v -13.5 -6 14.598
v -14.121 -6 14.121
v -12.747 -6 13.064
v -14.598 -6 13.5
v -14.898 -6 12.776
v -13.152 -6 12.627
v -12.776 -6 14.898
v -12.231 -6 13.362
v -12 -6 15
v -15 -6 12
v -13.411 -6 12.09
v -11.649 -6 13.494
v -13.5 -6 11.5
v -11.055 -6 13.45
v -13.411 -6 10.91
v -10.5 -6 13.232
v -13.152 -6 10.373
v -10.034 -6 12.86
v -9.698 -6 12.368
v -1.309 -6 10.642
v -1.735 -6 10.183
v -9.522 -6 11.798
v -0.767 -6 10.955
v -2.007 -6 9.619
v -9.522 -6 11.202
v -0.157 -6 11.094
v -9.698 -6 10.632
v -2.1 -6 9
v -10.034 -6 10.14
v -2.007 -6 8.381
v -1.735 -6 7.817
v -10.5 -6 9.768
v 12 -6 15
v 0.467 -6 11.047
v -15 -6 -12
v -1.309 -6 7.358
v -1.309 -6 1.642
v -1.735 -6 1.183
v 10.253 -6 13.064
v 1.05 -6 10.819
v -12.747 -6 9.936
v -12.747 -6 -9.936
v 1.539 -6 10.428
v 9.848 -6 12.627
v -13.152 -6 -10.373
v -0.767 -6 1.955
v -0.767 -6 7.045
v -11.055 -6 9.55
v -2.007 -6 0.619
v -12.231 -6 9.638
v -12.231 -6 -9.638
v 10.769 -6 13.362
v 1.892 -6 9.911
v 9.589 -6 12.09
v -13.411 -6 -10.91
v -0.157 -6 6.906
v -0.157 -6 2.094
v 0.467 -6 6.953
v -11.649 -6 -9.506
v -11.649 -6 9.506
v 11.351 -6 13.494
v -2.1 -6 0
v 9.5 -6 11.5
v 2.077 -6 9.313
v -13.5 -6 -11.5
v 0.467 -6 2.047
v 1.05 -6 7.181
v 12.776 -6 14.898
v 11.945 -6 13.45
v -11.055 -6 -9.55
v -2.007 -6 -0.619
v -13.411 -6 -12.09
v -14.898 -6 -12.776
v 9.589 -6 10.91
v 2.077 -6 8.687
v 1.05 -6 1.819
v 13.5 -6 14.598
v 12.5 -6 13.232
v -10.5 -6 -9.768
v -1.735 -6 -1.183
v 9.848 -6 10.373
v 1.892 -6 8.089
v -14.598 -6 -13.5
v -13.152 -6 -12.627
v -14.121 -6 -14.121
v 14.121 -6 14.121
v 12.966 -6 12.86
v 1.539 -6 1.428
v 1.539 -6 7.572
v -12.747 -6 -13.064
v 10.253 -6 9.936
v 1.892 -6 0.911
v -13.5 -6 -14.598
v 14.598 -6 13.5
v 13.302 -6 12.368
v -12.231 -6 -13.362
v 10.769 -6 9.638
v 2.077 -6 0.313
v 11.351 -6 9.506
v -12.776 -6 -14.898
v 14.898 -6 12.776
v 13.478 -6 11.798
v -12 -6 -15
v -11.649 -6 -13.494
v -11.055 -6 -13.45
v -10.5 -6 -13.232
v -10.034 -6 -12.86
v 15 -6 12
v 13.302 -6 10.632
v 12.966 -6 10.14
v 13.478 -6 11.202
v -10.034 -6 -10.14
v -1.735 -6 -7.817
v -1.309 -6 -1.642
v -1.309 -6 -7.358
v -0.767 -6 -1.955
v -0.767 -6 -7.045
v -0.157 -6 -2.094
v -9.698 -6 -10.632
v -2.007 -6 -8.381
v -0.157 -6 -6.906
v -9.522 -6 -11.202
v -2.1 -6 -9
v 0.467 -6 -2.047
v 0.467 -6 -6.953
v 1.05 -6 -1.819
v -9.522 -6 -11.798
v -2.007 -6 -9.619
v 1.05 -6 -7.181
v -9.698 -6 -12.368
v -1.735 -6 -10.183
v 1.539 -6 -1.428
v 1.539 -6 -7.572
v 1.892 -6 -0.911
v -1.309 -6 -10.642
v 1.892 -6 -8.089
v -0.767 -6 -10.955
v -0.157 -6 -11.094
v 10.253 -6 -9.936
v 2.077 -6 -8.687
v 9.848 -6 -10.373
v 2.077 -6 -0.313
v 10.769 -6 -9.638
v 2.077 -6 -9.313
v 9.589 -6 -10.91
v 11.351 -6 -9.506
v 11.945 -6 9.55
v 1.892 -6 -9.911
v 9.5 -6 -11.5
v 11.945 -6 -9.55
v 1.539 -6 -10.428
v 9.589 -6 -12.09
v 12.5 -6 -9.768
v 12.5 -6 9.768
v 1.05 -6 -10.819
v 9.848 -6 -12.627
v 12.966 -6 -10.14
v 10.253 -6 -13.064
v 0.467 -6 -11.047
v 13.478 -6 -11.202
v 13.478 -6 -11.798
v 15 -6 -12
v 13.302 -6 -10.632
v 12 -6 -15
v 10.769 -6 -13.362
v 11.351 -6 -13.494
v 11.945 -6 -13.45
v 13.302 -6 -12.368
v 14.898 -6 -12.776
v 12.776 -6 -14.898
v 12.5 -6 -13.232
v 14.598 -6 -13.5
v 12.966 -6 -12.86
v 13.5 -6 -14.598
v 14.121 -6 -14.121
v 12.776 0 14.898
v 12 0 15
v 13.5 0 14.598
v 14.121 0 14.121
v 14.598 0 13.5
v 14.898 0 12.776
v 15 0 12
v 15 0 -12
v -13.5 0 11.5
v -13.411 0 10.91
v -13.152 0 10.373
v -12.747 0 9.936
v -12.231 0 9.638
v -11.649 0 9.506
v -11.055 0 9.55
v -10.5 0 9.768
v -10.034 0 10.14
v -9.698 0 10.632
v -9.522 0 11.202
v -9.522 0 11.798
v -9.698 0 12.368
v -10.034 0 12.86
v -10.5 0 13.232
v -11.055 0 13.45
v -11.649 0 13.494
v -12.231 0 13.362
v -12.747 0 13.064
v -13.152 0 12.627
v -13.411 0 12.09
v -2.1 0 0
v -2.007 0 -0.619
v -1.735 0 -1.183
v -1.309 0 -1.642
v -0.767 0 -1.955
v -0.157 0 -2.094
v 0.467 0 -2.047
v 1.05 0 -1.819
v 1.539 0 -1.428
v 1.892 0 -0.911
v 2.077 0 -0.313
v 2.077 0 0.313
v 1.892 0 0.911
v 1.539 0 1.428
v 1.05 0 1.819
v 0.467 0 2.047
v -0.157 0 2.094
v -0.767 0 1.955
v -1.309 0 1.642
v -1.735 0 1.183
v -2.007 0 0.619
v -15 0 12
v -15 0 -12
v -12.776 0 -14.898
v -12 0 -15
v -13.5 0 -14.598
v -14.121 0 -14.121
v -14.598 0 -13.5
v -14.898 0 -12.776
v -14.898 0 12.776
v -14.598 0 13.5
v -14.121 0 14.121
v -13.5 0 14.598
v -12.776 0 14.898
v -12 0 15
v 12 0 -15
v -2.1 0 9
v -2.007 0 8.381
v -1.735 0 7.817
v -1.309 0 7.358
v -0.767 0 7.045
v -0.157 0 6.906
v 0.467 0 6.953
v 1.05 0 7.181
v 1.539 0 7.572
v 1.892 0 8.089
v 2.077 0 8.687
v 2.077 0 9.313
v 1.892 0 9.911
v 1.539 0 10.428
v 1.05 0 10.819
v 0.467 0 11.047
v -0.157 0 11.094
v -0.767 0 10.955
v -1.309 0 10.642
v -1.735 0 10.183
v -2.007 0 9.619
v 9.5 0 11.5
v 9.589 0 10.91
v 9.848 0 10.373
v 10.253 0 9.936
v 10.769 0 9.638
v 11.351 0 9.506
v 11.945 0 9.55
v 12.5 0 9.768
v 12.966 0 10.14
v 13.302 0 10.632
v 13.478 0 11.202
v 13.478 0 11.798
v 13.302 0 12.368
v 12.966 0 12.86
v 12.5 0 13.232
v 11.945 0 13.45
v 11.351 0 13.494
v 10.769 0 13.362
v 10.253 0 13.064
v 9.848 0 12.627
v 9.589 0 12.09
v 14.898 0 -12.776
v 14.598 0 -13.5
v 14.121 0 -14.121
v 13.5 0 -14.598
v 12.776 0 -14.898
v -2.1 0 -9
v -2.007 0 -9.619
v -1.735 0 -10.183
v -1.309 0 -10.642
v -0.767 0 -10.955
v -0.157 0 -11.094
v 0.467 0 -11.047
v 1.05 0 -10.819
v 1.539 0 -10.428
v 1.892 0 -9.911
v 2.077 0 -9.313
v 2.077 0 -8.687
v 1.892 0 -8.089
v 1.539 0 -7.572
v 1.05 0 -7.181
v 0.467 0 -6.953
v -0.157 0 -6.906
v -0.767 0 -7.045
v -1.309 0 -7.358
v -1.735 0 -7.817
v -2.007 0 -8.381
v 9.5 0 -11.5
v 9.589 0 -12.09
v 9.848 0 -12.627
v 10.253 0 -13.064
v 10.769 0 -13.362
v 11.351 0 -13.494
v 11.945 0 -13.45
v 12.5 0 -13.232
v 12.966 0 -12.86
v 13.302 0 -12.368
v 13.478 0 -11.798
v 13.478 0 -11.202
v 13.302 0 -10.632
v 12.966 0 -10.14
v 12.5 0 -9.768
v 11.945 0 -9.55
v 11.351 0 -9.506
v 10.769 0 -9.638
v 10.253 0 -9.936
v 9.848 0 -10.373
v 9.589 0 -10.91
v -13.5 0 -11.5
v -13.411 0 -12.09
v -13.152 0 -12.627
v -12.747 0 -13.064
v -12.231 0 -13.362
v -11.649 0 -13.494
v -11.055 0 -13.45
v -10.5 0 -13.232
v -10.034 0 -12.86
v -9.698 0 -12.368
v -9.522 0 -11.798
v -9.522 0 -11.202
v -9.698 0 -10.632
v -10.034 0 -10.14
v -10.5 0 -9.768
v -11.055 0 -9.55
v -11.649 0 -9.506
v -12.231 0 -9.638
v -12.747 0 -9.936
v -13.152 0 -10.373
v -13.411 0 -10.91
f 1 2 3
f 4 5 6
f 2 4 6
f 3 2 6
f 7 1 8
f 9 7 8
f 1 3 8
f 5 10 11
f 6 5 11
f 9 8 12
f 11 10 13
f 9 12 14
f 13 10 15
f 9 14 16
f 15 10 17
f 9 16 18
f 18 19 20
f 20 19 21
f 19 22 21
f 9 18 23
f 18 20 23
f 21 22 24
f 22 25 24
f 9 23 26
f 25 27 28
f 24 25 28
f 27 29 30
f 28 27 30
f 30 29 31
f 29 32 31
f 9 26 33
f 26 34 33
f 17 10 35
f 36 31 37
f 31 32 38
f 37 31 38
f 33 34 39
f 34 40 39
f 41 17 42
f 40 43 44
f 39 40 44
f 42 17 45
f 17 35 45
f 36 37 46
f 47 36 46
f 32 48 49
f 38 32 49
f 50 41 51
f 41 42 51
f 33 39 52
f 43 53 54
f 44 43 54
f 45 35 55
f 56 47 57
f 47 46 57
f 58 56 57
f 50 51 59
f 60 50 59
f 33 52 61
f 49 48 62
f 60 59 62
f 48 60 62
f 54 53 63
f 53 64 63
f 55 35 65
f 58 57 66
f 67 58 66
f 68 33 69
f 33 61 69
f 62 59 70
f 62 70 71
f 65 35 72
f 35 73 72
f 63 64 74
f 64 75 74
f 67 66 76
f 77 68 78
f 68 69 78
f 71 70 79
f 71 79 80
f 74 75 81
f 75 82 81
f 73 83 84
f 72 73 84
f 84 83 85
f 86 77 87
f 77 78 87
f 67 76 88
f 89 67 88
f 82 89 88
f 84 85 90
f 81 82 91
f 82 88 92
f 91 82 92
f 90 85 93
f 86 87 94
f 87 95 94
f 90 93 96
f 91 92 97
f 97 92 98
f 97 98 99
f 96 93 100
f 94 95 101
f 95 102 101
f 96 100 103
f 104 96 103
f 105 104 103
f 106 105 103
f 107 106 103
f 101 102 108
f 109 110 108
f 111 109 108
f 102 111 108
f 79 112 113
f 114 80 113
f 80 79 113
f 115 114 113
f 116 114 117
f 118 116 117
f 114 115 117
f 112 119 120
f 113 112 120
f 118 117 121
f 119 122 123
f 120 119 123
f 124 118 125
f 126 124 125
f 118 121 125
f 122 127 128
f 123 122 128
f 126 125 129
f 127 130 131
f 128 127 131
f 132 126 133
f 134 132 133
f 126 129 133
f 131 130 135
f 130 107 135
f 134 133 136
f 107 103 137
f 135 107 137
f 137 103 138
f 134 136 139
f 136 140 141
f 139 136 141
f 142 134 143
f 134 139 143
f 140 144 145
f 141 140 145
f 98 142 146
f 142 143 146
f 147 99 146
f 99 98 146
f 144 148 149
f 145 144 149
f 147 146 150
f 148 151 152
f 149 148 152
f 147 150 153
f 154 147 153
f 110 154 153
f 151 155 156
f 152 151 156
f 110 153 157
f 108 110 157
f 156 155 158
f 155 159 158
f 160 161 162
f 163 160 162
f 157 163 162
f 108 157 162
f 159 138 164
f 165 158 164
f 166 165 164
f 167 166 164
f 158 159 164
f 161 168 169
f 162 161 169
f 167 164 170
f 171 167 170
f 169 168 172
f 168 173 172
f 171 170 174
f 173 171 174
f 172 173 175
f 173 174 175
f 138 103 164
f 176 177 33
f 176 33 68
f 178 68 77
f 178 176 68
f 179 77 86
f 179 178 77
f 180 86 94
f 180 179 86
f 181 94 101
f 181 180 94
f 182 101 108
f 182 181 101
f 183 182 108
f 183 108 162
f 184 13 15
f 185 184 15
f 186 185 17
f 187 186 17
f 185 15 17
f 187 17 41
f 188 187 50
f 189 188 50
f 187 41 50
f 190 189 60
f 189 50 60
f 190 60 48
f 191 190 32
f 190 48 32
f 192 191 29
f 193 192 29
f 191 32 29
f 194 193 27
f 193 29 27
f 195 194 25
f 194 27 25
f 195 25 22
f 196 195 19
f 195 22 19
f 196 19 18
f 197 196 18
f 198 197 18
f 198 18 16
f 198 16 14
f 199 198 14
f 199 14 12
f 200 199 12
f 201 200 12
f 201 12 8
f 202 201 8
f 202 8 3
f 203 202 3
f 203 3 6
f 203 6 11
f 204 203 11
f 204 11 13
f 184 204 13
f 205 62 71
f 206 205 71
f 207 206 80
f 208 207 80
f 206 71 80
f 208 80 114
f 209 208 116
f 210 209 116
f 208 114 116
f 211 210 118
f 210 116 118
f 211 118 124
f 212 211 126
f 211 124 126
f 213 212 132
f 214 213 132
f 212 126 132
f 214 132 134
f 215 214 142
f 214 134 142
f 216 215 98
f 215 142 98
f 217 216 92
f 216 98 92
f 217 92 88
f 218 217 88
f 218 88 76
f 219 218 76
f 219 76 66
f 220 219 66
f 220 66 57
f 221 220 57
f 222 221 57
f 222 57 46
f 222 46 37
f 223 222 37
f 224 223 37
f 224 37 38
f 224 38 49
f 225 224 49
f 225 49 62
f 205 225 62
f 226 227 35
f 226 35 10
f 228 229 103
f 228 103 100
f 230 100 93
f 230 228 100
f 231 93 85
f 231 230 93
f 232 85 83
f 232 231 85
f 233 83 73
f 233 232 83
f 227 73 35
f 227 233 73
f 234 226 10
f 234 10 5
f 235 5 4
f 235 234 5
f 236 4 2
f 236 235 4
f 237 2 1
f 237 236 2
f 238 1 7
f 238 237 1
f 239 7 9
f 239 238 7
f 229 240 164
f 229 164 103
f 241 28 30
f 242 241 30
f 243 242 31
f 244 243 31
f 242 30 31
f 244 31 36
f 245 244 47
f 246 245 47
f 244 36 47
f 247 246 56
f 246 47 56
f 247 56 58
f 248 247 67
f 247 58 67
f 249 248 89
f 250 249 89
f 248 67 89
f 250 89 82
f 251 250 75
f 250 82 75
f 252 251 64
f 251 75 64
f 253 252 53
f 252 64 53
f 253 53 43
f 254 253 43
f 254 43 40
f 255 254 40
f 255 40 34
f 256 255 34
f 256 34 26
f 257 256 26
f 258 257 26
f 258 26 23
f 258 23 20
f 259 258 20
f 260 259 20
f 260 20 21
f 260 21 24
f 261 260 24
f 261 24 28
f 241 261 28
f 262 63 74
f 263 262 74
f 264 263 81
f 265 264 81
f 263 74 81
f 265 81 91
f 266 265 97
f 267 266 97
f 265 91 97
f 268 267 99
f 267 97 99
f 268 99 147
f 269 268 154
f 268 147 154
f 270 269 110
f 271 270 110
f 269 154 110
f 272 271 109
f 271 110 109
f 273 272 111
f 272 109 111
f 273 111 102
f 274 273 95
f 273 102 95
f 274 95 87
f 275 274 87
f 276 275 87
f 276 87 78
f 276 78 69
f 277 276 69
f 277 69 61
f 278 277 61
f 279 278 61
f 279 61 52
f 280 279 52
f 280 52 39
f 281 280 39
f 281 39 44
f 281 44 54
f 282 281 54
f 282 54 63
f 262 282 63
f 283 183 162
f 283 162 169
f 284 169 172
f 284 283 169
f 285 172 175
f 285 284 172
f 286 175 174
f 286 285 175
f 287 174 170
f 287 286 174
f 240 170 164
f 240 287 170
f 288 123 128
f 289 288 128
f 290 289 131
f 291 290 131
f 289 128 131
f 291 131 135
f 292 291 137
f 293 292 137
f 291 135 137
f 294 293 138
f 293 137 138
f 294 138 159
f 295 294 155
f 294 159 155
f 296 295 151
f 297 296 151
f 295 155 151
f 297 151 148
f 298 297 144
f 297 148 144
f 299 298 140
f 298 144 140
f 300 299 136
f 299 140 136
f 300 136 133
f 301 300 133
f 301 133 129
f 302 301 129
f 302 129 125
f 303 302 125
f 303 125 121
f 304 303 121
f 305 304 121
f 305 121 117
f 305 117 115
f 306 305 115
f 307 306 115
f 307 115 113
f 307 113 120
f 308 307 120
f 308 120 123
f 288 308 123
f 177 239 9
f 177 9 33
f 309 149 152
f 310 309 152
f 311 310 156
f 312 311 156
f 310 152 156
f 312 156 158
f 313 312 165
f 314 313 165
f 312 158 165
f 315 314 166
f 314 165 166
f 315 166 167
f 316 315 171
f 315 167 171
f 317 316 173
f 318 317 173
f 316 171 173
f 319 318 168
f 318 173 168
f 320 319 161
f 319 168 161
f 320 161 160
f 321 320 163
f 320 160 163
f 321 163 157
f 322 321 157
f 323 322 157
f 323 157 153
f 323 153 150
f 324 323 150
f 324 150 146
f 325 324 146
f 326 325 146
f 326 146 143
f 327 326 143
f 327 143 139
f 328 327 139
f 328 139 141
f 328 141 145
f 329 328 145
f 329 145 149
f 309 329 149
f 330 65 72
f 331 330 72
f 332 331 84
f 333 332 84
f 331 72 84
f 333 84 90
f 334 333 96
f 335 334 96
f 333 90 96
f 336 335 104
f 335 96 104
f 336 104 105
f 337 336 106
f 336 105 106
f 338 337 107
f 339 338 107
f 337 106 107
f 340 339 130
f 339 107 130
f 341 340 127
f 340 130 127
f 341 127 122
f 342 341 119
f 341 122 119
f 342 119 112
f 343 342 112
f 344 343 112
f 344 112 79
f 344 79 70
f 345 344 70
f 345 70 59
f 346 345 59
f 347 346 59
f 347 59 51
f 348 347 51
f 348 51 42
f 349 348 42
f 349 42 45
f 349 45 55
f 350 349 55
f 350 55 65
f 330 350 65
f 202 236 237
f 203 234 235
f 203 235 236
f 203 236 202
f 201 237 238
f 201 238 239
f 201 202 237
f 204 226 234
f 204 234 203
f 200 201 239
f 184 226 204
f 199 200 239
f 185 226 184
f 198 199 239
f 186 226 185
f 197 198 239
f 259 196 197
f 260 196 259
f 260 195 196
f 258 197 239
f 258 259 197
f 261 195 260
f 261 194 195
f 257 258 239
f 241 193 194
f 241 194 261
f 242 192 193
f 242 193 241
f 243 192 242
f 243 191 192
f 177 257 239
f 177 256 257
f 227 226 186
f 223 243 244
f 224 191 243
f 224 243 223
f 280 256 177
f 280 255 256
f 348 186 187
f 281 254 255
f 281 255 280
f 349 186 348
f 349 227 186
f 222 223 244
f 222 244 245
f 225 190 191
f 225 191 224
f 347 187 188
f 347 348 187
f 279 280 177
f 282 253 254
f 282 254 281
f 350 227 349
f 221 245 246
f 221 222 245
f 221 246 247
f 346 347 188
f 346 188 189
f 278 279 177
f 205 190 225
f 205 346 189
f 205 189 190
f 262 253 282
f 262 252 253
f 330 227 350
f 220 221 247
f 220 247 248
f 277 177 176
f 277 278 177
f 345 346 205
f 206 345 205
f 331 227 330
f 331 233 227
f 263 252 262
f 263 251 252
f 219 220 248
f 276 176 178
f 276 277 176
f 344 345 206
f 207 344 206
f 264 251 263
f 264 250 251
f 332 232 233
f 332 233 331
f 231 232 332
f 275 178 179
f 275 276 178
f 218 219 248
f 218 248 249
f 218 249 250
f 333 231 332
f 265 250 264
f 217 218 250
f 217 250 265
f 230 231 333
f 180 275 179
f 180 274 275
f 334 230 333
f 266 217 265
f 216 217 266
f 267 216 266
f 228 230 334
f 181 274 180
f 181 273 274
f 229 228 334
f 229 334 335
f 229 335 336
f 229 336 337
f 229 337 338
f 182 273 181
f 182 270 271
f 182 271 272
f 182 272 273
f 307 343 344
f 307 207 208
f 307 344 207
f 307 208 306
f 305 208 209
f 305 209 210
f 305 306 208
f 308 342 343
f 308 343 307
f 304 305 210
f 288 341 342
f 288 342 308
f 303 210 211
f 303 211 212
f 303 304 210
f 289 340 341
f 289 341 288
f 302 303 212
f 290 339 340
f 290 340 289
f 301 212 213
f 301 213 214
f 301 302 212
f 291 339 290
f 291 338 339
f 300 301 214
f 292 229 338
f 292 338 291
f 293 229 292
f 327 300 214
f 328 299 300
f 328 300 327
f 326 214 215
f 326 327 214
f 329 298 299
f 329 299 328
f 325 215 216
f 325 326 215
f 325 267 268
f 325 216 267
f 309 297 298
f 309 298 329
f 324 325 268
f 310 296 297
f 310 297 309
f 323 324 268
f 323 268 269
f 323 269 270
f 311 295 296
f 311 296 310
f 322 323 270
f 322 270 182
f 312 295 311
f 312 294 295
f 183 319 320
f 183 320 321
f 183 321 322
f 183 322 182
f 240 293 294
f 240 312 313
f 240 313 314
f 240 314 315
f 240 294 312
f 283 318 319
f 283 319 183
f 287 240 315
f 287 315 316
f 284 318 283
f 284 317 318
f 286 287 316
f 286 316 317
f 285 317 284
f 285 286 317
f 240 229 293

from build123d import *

# Parameters (mm, degrees)
BOSS_EXTRUDE1_DEPTH          = 6
M5X0_8_TAPPED_HOLE1_D        = 4.2
F_4_0_4_DIAMETER_HOLE1_D     = 4
F_4_0_4_DIAMETER_HOLE1_DEPTH = 10
F_4_0_4_DIAMETER_HOLE1_TIP   = 1.201721238


with BuildPart() as part:
    # Sketch2 → Boss-Extrude1 (new body)
    with BuildSketch(Plane(origin=(0, 0, 0), x_dir=(1, 0, 0), z_dir=(0, 1, 0))):
        with BuildLine():
            Line((-12, -15), (12, -15))
            ThreePointArc((12, -15), (14.121320344, -14.121320344), (15, -12))
            Line((15, -12), (15, 12))
            ThreePointArc((15, 12), (14.121320344, 14.121320344), (12, 15))
            Line((12, 15), (-12, 15))
            ThreePointArc((-12, 15), (-14.121320344, 14.121320344), (-15, 12))
            Line((-15, 12), (-15, -12))
            ThreePointArc((-15, -12), (-14.121320344, -14.121320344), (-12, -15))
        make_face()
    extrude(amount=-BOSS_EXTRUDE1_DEPTH)

    # M5x0.8 Tapped Hole1 (through all)
    with Locations(Plane(origin=(0, 0, 0), x_dir=(1, 0, 0), z_dir=(0, 1, 0))):
        with Locations((0, 0), (0, 9), (0, -9)):
            Hole(M5X0_8_TAPPED_HOLE1_D / 2)

    # Ø4.0 (4) Diameter Hole1
    with Locations(Plane(origin=(0, 0, 0), x_dir=(1, 0, 0), z_dir=(0, 1, 0))):
        with Locations((-11.5, -11.5), (-11.5, 11.5), (11.5, 11.5), (11.5, -11.5)):
            Hole(F_4_0_4_DIAMETER_HOLE1_D / 2, depth=F_4_0_4_DIAMETER_HOLE1_DEPTH)
            with Locations((0, 0, -(F_4_0_4_DIAMETER_HOLE1_DEPTH + F_4_0_4_DIAMETER_HOLE1_TIP / 2))):  # 118° drill point
                Cone(0, F_4_0_4_DIAMETER_HOLE1_D / 2, F_4_0_4_DIAMETER_HOLE1_TIP, mode=Mode.SUBTRACT)


solid = part.part
